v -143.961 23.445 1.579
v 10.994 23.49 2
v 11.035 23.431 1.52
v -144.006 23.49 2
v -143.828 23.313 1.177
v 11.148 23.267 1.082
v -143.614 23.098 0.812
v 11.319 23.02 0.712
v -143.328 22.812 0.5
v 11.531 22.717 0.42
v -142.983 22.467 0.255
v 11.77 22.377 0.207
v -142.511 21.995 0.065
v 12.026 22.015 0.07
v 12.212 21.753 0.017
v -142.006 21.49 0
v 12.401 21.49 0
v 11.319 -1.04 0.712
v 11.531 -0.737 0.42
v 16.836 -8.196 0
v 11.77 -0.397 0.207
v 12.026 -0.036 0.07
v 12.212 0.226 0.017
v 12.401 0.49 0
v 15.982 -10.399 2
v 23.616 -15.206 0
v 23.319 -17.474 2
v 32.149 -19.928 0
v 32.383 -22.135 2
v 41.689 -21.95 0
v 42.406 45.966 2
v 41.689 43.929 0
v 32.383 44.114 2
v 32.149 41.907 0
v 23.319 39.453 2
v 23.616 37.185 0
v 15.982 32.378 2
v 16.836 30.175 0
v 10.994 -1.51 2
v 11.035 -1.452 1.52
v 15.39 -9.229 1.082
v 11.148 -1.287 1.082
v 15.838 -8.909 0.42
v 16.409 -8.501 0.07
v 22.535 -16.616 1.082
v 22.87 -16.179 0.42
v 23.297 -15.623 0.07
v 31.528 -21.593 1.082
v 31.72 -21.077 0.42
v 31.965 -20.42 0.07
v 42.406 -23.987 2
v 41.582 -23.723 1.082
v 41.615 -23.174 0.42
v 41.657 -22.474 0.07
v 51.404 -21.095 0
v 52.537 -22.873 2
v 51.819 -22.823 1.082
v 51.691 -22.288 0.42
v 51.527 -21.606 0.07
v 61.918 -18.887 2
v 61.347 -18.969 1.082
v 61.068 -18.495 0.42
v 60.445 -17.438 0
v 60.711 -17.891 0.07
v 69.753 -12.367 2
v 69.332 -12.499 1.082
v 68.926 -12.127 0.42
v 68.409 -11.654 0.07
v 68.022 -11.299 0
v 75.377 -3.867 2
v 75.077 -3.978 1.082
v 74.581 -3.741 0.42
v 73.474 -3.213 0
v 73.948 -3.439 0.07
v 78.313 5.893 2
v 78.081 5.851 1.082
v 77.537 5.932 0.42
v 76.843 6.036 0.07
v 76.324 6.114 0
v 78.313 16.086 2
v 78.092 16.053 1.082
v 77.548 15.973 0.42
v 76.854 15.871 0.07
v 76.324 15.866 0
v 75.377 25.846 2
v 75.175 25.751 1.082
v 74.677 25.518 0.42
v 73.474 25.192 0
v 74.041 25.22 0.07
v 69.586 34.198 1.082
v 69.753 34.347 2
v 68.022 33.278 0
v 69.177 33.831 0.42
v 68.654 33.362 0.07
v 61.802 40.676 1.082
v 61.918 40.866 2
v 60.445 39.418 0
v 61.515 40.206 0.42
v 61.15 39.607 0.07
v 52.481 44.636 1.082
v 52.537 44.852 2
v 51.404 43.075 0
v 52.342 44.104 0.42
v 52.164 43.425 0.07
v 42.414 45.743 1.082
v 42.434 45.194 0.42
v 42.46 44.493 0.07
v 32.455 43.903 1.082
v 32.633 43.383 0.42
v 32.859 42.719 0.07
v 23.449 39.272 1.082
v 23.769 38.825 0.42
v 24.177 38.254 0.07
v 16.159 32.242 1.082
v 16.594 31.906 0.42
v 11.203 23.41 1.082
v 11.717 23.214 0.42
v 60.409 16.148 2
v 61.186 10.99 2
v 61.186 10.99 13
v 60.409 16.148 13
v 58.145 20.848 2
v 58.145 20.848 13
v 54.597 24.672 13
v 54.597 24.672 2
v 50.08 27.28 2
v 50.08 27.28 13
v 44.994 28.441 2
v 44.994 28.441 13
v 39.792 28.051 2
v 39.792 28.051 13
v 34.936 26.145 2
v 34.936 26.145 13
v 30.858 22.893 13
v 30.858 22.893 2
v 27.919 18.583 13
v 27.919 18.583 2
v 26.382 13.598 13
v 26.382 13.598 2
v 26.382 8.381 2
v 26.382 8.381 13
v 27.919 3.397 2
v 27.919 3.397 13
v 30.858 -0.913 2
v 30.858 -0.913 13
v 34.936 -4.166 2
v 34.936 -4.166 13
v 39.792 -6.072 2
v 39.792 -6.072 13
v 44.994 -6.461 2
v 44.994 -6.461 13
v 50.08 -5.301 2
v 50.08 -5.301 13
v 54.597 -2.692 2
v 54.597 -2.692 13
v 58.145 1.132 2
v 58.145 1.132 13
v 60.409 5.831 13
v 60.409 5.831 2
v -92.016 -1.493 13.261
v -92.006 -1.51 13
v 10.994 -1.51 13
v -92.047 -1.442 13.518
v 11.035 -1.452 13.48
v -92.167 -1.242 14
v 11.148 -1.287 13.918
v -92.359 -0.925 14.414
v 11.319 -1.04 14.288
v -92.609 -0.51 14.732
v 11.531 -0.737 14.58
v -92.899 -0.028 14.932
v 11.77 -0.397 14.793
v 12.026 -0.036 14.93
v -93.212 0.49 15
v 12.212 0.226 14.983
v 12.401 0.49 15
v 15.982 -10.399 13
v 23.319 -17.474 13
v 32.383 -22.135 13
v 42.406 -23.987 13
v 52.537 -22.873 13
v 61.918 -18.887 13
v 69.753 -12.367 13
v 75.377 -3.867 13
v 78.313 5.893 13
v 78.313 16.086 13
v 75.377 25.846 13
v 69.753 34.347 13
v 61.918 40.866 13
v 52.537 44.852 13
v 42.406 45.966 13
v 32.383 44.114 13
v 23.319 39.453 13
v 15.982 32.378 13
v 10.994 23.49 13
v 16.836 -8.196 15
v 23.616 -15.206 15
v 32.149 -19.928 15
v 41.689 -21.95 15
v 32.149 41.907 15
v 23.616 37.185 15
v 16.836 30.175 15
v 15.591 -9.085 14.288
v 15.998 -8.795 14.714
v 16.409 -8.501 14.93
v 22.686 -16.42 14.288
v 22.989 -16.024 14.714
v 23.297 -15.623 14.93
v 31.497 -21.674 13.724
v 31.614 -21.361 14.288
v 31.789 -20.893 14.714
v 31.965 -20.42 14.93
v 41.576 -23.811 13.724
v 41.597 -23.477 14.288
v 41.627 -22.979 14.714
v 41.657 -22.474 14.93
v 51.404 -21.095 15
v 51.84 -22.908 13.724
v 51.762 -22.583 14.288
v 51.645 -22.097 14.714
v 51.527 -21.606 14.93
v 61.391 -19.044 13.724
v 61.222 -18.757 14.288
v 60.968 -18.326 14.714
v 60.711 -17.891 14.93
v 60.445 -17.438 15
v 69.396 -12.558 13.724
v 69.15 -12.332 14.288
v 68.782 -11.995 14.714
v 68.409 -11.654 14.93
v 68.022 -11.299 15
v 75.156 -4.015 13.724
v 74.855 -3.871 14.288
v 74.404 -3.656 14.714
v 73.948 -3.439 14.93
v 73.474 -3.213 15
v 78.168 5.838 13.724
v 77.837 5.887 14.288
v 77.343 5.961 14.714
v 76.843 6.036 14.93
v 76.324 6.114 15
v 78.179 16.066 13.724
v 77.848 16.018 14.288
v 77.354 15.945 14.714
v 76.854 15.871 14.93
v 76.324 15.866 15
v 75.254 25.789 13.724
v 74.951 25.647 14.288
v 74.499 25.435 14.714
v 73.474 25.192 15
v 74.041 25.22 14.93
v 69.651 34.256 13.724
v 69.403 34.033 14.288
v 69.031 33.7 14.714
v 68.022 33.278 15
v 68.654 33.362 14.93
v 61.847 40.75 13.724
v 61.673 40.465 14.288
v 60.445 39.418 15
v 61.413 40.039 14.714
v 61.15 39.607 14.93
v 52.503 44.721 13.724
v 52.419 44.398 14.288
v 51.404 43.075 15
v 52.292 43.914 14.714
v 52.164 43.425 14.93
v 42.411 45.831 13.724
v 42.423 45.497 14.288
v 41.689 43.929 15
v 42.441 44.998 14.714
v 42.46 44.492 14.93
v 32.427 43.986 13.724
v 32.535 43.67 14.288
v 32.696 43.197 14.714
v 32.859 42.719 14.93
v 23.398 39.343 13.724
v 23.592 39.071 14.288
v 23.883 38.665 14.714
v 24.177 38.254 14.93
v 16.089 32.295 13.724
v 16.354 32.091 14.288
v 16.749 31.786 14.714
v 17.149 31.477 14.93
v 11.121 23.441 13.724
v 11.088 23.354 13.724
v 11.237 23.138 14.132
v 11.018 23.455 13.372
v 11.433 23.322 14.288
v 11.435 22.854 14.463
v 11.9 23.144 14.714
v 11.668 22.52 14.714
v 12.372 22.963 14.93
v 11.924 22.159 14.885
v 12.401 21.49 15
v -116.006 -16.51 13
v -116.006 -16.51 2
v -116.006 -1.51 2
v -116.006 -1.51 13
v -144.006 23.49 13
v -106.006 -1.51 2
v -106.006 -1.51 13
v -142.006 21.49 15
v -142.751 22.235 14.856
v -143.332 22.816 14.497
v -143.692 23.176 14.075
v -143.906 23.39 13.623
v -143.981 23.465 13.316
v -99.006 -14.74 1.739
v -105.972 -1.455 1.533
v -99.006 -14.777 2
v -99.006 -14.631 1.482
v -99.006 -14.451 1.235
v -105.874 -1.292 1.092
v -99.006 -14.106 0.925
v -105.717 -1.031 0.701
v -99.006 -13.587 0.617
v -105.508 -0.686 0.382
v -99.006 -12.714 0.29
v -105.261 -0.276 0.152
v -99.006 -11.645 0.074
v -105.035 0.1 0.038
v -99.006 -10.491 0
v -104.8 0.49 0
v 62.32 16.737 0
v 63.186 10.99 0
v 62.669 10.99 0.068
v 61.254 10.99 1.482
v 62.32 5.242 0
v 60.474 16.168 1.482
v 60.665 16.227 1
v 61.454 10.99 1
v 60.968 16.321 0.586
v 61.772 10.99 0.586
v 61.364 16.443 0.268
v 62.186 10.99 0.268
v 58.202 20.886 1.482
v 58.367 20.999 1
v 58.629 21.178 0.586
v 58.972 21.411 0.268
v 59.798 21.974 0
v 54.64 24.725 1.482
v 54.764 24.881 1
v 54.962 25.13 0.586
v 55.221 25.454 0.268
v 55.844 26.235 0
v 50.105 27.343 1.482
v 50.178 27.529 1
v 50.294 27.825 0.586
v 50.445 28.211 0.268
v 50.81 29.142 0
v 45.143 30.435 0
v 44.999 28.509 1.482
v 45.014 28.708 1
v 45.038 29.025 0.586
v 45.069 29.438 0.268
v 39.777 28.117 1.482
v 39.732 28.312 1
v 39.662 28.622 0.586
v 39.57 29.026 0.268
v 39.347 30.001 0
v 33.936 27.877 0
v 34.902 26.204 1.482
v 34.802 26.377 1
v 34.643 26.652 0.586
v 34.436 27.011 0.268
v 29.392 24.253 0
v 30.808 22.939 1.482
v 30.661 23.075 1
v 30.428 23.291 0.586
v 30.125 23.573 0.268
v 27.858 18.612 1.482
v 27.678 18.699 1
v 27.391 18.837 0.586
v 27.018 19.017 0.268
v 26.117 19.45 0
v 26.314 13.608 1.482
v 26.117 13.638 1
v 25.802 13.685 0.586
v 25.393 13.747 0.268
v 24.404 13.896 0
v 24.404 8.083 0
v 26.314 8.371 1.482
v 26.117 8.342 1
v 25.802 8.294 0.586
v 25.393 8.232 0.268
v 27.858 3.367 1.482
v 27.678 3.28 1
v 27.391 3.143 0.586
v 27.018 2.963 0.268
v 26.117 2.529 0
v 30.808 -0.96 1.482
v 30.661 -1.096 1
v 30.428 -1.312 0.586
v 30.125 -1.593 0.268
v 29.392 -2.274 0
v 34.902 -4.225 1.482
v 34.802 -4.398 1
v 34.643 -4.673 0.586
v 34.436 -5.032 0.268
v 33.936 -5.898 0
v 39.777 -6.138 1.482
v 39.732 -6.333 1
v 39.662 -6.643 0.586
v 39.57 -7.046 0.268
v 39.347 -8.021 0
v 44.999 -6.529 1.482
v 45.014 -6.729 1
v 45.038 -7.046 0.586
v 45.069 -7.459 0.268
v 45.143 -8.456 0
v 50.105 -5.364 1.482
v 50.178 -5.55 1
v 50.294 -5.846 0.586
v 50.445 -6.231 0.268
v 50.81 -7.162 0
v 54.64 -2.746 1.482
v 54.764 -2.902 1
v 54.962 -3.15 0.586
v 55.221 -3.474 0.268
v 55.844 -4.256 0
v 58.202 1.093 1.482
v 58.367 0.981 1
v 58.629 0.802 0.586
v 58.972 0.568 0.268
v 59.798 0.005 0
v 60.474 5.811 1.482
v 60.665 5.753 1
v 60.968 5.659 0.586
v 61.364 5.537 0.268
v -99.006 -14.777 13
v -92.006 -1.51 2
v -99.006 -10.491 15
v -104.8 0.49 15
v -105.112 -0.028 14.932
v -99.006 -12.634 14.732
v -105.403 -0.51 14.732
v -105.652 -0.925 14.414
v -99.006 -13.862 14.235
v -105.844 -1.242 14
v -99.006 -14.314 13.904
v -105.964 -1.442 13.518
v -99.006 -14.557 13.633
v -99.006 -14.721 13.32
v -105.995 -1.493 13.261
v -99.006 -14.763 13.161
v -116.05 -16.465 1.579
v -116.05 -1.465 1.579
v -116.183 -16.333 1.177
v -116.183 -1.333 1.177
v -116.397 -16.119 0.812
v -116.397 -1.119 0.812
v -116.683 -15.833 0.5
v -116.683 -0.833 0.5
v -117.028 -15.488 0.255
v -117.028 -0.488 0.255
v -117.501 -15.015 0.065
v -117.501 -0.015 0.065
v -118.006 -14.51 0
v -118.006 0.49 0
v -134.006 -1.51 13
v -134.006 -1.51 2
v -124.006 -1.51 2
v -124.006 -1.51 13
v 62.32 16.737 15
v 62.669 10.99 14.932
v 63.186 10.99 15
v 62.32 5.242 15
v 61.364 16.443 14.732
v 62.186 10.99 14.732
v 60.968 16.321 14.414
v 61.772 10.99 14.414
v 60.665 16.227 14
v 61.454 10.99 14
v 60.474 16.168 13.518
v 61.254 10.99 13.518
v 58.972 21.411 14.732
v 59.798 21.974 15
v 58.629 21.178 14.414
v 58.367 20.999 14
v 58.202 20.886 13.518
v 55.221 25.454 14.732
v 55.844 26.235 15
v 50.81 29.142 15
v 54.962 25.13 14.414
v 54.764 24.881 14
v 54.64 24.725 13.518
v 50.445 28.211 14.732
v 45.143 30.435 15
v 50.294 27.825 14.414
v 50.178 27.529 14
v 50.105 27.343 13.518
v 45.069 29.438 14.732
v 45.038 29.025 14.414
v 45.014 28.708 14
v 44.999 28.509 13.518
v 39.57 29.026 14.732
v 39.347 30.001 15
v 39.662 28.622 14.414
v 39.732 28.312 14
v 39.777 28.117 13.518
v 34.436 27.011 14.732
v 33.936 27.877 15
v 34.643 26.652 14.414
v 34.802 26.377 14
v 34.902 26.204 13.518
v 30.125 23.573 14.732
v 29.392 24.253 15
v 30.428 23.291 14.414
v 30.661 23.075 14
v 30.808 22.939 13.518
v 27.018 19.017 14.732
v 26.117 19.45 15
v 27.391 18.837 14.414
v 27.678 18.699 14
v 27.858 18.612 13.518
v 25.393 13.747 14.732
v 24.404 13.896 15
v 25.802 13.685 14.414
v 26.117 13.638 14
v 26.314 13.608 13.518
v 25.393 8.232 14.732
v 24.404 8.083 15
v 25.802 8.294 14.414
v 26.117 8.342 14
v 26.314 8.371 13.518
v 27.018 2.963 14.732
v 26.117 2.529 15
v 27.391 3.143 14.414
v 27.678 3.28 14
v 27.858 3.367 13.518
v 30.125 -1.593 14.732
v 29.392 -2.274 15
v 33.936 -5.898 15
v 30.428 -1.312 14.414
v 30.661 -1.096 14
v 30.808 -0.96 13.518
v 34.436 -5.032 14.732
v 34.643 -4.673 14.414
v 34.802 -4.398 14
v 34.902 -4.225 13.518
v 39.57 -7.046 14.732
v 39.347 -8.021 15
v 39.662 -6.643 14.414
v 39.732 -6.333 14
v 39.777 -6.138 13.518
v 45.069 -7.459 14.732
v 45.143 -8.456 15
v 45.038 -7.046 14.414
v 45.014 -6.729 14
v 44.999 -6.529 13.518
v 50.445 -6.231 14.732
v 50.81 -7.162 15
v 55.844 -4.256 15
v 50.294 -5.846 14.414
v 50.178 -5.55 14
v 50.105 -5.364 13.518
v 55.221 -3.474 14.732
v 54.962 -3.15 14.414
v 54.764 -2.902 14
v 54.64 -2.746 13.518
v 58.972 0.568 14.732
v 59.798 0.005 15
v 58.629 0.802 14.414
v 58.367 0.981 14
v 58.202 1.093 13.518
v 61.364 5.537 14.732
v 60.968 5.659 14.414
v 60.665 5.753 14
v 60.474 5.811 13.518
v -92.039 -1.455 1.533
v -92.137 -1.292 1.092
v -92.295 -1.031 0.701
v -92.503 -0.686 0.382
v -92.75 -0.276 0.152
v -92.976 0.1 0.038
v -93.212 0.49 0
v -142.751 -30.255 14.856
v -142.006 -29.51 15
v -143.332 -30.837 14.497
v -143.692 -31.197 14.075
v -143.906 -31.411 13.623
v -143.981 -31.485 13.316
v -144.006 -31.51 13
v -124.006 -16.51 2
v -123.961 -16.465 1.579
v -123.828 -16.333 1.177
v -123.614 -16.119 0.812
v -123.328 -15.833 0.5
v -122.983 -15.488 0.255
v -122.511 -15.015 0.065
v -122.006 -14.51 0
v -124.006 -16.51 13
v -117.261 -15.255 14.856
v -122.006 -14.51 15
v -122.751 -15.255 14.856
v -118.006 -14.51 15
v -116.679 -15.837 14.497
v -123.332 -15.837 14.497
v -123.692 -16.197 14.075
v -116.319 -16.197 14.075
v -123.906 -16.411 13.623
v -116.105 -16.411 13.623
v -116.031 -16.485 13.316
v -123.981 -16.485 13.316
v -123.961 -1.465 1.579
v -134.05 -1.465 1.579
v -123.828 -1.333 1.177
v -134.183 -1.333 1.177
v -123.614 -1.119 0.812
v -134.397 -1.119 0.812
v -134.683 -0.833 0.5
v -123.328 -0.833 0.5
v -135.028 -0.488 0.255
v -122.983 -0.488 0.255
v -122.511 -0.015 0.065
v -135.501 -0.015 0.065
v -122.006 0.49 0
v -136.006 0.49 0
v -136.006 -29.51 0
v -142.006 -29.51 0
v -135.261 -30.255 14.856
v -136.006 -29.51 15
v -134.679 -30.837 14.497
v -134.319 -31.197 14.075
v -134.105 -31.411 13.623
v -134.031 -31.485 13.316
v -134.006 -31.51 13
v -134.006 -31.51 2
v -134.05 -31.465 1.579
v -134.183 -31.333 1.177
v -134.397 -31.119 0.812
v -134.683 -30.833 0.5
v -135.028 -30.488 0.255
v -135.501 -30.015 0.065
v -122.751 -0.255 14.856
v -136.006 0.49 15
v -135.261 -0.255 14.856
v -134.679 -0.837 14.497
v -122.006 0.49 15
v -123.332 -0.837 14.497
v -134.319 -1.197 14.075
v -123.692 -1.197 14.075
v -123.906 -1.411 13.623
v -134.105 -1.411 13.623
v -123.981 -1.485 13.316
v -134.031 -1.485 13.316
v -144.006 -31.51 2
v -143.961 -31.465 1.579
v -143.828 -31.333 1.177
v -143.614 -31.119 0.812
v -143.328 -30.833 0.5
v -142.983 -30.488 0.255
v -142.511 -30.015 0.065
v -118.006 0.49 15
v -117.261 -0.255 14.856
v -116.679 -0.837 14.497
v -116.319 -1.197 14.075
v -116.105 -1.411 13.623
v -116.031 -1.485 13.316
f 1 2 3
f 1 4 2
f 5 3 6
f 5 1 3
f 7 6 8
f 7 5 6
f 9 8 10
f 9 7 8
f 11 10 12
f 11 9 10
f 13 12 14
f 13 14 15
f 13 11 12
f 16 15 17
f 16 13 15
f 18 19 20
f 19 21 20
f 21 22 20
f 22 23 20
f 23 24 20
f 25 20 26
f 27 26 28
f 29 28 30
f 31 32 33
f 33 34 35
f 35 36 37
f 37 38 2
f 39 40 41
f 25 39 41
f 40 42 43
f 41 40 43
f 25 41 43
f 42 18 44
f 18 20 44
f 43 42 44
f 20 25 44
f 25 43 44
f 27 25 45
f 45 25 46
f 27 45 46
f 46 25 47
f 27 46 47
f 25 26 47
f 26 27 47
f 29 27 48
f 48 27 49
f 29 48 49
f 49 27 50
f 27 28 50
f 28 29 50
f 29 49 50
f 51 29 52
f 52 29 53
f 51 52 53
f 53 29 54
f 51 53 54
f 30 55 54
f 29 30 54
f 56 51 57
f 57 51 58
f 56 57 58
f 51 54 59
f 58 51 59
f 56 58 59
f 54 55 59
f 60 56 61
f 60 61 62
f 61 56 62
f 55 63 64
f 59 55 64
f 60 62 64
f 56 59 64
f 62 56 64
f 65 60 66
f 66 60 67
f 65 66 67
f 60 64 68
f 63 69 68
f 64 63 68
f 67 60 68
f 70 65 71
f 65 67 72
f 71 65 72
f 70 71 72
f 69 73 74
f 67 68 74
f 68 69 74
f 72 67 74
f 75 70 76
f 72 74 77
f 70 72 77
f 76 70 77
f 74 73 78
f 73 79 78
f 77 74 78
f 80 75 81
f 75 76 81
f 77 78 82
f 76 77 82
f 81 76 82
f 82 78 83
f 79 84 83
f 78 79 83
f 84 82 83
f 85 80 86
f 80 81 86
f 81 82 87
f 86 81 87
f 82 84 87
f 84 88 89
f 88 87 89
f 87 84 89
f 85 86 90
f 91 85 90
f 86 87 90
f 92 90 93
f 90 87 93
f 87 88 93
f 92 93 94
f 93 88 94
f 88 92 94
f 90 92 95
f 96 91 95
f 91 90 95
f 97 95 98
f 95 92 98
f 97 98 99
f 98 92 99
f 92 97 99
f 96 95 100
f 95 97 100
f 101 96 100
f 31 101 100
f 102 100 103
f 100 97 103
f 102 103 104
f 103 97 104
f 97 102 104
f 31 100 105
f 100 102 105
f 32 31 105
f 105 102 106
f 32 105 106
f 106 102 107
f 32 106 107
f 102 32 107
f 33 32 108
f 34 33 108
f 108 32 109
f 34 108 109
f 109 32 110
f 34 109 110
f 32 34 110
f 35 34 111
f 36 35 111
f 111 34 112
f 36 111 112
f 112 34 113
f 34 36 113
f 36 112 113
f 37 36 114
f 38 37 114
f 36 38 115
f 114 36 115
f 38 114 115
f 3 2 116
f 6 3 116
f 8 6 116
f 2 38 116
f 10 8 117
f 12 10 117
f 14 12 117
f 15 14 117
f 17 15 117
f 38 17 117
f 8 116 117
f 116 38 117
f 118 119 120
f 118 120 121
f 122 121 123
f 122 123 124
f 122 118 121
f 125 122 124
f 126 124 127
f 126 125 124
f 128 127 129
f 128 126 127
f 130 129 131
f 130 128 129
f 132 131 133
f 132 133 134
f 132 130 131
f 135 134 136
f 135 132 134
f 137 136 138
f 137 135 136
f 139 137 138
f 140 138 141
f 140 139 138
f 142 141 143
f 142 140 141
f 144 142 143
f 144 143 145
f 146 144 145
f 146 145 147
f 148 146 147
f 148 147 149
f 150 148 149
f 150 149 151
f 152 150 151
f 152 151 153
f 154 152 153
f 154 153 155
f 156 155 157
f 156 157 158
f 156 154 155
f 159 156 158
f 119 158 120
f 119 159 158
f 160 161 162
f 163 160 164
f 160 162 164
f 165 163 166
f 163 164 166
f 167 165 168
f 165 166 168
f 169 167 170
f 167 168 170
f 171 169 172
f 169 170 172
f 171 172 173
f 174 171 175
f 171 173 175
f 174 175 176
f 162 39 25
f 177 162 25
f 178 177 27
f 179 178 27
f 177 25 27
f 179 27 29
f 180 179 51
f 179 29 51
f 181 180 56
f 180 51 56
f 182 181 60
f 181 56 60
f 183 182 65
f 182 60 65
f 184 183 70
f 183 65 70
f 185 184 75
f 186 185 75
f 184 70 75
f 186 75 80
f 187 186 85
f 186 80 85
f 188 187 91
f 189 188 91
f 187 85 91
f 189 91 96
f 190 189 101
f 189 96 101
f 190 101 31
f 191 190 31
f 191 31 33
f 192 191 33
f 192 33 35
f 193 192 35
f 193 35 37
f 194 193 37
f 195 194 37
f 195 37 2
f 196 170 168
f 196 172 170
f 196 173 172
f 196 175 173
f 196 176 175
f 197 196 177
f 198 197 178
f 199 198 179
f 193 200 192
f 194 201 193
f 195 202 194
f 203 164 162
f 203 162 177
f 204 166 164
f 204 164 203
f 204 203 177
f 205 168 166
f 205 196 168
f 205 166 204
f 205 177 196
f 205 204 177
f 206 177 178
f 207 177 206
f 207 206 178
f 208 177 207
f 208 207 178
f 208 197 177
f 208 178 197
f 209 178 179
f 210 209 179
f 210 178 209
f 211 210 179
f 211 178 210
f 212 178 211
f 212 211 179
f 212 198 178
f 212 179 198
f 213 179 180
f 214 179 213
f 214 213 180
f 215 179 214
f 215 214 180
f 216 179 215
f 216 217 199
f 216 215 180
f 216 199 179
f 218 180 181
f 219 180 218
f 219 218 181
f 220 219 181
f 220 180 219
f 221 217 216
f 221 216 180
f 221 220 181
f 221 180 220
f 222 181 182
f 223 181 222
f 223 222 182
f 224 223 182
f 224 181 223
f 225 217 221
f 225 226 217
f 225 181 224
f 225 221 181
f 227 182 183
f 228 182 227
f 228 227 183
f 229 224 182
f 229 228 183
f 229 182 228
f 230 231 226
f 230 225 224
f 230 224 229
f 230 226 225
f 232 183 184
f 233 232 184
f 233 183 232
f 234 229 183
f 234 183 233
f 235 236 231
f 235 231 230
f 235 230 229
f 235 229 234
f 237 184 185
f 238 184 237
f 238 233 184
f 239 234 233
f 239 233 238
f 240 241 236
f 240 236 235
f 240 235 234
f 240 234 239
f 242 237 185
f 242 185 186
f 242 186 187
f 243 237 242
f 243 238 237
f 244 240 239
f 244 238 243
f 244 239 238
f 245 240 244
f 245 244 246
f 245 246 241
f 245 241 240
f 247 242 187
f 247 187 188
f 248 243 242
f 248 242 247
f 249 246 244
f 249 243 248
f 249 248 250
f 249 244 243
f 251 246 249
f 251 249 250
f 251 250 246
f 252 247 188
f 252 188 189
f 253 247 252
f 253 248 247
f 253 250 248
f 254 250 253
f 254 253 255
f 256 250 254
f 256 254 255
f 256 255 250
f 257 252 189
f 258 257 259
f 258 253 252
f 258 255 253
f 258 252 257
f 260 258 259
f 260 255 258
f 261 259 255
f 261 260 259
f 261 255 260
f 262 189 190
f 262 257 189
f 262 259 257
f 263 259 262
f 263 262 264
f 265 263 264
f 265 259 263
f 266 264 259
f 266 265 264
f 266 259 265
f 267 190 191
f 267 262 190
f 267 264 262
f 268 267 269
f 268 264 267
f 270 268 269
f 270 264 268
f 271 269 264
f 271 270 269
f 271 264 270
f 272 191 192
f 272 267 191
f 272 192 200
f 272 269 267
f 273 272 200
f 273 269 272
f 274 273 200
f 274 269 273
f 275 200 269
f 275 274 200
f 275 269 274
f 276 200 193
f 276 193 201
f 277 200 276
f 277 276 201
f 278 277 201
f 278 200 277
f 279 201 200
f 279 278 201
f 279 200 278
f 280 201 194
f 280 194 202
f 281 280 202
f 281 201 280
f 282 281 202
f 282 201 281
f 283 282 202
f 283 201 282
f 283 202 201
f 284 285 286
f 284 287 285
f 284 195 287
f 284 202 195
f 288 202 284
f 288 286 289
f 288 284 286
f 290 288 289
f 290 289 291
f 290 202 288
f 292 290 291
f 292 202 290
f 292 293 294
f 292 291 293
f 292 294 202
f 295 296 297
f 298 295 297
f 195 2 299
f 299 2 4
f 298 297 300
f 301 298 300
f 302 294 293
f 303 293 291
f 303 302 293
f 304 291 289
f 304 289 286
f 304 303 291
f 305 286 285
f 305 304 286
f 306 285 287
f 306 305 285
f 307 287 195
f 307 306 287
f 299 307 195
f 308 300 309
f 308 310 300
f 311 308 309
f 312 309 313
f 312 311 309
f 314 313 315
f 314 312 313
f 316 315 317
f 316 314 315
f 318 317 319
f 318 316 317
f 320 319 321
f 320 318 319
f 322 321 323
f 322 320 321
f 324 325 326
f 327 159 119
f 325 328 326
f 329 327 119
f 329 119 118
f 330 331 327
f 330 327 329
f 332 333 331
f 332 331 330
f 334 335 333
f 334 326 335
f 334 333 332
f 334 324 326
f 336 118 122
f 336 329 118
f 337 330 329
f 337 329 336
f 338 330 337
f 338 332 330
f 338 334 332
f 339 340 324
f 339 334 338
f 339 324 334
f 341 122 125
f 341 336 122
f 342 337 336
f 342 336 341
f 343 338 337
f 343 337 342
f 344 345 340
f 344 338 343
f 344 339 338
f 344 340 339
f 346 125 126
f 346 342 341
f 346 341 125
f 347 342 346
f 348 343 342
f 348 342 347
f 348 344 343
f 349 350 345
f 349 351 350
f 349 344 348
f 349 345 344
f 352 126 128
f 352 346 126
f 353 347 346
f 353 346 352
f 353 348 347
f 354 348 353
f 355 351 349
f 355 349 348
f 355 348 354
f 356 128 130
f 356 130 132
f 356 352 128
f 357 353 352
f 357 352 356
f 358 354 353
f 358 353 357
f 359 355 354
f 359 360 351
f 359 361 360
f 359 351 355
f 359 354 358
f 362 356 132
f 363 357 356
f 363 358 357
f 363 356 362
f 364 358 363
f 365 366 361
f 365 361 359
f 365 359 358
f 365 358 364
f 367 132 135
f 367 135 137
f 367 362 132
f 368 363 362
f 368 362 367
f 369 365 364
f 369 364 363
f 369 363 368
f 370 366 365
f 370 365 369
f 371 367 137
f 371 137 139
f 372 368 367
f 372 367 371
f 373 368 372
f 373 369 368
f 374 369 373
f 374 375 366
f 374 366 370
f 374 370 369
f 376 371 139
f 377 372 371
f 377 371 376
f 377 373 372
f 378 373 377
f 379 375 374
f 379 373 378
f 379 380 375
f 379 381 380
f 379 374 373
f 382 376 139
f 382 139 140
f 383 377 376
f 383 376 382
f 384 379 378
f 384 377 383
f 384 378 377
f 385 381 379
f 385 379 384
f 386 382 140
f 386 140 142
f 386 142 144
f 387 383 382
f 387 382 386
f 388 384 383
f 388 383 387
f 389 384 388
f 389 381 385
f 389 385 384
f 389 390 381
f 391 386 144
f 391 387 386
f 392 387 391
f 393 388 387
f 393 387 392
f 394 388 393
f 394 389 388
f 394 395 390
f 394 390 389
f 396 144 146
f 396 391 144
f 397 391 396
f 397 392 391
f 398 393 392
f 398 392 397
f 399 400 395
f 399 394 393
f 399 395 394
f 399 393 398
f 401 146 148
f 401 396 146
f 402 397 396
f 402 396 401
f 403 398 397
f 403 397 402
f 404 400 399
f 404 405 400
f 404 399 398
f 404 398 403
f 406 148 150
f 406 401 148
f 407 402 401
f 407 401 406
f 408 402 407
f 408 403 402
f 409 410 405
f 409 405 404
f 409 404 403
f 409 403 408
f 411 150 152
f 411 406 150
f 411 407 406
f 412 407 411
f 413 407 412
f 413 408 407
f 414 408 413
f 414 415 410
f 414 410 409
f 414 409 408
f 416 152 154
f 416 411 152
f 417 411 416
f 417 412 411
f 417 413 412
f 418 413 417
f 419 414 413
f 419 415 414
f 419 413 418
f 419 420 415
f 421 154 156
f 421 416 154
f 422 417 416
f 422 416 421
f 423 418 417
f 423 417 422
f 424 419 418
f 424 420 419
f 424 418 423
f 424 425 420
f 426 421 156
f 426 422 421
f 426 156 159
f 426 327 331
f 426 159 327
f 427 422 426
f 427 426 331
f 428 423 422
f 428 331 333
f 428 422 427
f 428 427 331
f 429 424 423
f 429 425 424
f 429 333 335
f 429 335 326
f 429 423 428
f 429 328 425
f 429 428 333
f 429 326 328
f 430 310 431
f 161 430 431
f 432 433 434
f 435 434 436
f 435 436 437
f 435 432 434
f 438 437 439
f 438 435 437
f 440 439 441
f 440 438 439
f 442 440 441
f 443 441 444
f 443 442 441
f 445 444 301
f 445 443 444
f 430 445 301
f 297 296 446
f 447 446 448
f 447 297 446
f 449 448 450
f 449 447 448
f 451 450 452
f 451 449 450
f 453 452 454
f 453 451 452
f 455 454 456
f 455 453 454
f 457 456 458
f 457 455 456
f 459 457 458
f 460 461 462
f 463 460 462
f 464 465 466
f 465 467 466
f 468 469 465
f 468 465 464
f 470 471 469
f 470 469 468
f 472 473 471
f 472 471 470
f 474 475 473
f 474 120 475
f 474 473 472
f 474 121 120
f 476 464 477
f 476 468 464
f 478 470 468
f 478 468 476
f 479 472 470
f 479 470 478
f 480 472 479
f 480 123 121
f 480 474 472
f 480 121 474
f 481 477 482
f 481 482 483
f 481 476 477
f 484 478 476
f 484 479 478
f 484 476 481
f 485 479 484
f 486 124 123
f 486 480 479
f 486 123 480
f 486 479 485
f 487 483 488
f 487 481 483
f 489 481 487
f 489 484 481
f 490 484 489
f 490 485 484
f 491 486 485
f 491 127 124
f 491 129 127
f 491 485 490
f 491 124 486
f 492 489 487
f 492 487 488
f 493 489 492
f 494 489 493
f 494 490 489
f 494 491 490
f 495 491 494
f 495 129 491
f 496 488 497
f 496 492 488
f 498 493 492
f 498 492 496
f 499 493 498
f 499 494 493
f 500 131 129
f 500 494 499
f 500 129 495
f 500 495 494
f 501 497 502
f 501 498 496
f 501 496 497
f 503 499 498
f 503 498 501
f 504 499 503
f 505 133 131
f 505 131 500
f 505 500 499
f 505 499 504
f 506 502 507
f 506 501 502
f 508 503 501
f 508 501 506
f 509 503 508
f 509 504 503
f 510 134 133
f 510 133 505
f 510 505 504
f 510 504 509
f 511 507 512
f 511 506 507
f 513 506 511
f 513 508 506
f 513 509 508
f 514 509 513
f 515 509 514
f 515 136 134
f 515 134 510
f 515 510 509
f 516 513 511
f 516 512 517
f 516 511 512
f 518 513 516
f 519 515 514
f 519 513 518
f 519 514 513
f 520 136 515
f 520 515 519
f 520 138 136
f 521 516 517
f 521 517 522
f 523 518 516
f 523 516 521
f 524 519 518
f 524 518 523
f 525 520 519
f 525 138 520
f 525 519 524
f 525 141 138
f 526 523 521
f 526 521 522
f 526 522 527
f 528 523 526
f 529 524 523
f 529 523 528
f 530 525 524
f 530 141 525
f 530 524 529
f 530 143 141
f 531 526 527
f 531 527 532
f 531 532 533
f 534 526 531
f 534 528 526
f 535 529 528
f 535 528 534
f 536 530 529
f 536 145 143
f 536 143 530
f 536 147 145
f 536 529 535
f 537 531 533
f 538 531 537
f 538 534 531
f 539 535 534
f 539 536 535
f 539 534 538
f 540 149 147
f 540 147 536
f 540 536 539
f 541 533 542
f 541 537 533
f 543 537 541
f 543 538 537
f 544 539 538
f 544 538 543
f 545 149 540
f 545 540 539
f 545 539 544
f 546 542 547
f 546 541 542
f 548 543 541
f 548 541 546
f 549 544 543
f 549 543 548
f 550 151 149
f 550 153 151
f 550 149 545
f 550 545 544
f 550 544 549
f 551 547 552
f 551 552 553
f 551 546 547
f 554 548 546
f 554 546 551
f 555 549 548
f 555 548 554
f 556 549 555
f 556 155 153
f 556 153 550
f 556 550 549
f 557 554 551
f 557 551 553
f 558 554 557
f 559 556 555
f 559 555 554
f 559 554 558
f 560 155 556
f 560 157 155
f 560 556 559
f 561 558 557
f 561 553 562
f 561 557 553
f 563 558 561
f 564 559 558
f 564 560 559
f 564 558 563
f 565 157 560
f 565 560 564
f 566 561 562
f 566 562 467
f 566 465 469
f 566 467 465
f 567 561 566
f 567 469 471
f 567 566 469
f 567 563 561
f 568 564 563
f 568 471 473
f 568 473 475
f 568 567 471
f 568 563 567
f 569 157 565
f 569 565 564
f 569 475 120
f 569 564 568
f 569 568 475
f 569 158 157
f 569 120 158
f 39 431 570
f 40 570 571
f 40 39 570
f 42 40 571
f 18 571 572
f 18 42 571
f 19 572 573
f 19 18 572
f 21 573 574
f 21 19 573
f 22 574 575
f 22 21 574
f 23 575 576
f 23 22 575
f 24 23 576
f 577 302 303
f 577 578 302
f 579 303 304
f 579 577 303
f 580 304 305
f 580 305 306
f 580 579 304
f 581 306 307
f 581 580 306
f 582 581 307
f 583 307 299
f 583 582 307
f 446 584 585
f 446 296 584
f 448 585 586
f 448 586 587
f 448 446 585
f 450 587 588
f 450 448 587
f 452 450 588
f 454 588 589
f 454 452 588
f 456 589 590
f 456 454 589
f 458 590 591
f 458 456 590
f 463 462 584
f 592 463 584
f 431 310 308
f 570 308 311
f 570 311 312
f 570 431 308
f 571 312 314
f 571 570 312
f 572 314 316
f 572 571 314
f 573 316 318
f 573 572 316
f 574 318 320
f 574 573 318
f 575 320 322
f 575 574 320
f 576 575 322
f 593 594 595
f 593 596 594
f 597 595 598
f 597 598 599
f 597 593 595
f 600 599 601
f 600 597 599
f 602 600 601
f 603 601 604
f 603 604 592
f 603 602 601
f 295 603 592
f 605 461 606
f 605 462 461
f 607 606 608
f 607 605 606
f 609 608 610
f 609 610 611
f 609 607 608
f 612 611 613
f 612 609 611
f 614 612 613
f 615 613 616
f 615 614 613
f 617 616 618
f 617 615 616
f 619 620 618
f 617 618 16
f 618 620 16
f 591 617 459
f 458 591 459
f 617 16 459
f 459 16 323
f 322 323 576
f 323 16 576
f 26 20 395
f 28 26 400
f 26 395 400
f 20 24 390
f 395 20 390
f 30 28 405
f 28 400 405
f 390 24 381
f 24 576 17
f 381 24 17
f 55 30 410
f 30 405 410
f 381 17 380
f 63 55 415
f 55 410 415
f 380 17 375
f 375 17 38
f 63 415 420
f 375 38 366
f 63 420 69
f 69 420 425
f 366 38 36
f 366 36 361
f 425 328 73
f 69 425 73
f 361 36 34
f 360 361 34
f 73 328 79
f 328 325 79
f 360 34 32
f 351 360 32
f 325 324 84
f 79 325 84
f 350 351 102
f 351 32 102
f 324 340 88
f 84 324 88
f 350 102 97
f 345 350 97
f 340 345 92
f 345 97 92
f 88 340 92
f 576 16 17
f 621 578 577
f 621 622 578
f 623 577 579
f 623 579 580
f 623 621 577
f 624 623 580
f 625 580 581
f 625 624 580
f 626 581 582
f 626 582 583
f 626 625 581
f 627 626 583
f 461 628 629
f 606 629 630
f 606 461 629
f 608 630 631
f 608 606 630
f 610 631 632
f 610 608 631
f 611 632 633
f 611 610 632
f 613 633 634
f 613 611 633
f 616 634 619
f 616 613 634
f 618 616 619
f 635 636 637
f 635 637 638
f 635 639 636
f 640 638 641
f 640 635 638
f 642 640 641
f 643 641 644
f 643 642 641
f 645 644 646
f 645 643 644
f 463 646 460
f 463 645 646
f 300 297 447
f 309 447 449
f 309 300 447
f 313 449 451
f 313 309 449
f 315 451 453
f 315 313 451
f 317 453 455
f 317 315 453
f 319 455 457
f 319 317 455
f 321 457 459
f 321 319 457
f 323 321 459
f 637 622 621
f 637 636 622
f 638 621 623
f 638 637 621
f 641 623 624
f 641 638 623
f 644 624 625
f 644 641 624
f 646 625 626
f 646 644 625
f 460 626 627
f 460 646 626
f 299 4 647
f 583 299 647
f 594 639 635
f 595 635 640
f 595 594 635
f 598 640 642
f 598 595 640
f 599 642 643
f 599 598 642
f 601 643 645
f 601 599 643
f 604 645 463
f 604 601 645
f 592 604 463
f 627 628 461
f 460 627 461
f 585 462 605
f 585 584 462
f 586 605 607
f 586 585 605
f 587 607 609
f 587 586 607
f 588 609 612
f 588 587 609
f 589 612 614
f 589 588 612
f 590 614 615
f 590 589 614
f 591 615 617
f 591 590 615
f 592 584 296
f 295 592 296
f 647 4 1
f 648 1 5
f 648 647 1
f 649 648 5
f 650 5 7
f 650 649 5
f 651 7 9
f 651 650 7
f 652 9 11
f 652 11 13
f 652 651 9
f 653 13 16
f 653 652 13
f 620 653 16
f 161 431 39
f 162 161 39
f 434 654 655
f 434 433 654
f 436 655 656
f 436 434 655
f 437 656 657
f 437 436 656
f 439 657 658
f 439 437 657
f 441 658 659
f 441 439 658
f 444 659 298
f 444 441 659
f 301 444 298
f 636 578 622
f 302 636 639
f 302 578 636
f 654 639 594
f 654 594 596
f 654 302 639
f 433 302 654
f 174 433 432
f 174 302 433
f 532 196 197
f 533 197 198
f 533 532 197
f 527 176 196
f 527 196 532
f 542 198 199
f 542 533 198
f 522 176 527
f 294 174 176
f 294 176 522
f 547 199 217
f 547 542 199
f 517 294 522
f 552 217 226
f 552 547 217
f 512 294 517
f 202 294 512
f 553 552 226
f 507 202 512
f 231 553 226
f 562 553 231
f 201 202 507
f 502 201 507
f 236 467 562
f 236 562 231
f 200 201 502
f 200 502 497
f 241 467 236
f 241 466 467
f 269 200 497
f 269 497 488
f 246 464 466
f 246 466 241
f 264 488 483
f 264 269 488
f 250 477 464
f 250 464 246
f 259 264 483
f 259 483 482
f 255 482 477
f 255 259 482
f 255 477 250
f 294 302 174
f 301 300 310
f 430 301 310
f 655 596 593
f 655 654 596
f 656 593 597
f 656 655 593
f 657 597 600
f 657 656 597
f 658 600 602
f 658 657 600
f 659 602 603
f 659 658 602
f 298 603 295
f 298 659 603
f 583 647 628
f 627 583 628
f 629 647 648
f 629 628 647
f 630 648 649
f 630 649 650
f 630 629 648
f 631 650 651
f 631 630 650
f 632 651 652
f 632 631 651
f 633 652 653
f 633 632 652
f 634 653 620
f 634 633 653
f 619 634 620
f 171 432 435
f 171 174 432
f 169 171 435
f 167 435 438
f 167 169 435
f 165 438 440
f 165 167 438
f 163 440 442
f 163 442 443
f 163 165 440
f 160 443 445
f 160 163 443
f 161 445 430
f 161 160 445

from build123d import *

# Parameters (mm, degrees)
F0_R     = 17.5
F1_DEPTH = 15
F2_R     = 2
F3_R     = 2


with BuildPart() as f1:
    # F0 (on Top) → F1 (new body)
    with BuildSketch(Plane.XY):
        with BuildLine():
            ThreePointArc((10.99441, -1.51029), (78.686152, 10.98971), (10.99441, 23.48971))
            Line((10.99441, 23.48971), (-144.00559, 23.48971))
            Line((-144.00559, 23.48971), (-144.00559, -1.51029))
            Line((-144.00559, -1.51029), (-144.00559, -31.51029))
            Line((-144.00559, -31.51029), (-134.00559, -31.51029))
            Line((-134.00559, -31.51029), (-134.00559, -1.51029))
            Line((-134.00559, -1.51029), (-124.00559, -1.51029))
            Line((-124.00559, -1.51029), (-124.00559, -16.51029))
            Line((-124.00559, -16.51029), (-116.00559, -16.51029))
            Line((-116.00559, -16.51029), (-116.00559, -1.51029))
            Line((-116.00559, -1.51029), (-106.00559, -1.51029))
            Line((-106.00559, -1.51029), (-99.00559, -14.776789))
            Line((-99.00559, -14.776789), (-92.00559, -1.51029))
            Line((-92.00559, -1.51029), (10.99441, -1.51029))
        make_face()
        with Locations((43.686152, 10.98971)):
            Circle(F0_R, mode=Mode.SUBTRACT)
    extrude(amount=F1_DEPTH)

    # F2
    f2_edges = [f1.edges().sort_by_distance(p)[0] for p in [
        (78.686152, 10.98971, 0),
        (-66.50559, 23.48971, 0),
        (-40.50559, -1.51029, 0),
        (-95.50559, -8.143539, 0),
        (-102.50559, -8.143539, 0),
        (-116.00559, -9.01029, 0),
        (-124.00559, -9.01029, 0),
        (-134.00559, -16.51029, 0),
        (-144.00559, -4.01029, 0),
        (26.186152, 10.98971, 0),
        (-111.00559, -1.51029, 0),
        (-129.00559, -1.51029, 0),
        (-120.00559, -16.51029, 0),
        (-139.00559, -31.51029, 0),
    ]]
    fillet(f2_edges, radius=F2_R)

    # F3
    f3_edges = [f1.edges().sort_by_distance(p)[0] for p in [
        (-66.50559, 23.48971, 15),
        (-144.00559, -4.01029, 15),
        (-139.00559, -31.51029, 15),
        (-134.00559, -16.51029, 15),
        (-129.00559, -1.51029, 15),
        (-124.00559, -9.01029, 15),
        (-120.00559, -16.51029, 15),
        (-116.00559, -9.01029, 15),
        (-111.00559, -1.51029, 15),
        (-102.50559, -8.143539, 15),
        (-95.50559, -8.143539, 15),
        (-40.50559, -1.51029, 15),
        (78.686152, 10.98971, 15),
        (26.186152, 10.98971, 15),
    ]]
    fillet(f3_edges, radius=F3_R)


solid = f1.part
